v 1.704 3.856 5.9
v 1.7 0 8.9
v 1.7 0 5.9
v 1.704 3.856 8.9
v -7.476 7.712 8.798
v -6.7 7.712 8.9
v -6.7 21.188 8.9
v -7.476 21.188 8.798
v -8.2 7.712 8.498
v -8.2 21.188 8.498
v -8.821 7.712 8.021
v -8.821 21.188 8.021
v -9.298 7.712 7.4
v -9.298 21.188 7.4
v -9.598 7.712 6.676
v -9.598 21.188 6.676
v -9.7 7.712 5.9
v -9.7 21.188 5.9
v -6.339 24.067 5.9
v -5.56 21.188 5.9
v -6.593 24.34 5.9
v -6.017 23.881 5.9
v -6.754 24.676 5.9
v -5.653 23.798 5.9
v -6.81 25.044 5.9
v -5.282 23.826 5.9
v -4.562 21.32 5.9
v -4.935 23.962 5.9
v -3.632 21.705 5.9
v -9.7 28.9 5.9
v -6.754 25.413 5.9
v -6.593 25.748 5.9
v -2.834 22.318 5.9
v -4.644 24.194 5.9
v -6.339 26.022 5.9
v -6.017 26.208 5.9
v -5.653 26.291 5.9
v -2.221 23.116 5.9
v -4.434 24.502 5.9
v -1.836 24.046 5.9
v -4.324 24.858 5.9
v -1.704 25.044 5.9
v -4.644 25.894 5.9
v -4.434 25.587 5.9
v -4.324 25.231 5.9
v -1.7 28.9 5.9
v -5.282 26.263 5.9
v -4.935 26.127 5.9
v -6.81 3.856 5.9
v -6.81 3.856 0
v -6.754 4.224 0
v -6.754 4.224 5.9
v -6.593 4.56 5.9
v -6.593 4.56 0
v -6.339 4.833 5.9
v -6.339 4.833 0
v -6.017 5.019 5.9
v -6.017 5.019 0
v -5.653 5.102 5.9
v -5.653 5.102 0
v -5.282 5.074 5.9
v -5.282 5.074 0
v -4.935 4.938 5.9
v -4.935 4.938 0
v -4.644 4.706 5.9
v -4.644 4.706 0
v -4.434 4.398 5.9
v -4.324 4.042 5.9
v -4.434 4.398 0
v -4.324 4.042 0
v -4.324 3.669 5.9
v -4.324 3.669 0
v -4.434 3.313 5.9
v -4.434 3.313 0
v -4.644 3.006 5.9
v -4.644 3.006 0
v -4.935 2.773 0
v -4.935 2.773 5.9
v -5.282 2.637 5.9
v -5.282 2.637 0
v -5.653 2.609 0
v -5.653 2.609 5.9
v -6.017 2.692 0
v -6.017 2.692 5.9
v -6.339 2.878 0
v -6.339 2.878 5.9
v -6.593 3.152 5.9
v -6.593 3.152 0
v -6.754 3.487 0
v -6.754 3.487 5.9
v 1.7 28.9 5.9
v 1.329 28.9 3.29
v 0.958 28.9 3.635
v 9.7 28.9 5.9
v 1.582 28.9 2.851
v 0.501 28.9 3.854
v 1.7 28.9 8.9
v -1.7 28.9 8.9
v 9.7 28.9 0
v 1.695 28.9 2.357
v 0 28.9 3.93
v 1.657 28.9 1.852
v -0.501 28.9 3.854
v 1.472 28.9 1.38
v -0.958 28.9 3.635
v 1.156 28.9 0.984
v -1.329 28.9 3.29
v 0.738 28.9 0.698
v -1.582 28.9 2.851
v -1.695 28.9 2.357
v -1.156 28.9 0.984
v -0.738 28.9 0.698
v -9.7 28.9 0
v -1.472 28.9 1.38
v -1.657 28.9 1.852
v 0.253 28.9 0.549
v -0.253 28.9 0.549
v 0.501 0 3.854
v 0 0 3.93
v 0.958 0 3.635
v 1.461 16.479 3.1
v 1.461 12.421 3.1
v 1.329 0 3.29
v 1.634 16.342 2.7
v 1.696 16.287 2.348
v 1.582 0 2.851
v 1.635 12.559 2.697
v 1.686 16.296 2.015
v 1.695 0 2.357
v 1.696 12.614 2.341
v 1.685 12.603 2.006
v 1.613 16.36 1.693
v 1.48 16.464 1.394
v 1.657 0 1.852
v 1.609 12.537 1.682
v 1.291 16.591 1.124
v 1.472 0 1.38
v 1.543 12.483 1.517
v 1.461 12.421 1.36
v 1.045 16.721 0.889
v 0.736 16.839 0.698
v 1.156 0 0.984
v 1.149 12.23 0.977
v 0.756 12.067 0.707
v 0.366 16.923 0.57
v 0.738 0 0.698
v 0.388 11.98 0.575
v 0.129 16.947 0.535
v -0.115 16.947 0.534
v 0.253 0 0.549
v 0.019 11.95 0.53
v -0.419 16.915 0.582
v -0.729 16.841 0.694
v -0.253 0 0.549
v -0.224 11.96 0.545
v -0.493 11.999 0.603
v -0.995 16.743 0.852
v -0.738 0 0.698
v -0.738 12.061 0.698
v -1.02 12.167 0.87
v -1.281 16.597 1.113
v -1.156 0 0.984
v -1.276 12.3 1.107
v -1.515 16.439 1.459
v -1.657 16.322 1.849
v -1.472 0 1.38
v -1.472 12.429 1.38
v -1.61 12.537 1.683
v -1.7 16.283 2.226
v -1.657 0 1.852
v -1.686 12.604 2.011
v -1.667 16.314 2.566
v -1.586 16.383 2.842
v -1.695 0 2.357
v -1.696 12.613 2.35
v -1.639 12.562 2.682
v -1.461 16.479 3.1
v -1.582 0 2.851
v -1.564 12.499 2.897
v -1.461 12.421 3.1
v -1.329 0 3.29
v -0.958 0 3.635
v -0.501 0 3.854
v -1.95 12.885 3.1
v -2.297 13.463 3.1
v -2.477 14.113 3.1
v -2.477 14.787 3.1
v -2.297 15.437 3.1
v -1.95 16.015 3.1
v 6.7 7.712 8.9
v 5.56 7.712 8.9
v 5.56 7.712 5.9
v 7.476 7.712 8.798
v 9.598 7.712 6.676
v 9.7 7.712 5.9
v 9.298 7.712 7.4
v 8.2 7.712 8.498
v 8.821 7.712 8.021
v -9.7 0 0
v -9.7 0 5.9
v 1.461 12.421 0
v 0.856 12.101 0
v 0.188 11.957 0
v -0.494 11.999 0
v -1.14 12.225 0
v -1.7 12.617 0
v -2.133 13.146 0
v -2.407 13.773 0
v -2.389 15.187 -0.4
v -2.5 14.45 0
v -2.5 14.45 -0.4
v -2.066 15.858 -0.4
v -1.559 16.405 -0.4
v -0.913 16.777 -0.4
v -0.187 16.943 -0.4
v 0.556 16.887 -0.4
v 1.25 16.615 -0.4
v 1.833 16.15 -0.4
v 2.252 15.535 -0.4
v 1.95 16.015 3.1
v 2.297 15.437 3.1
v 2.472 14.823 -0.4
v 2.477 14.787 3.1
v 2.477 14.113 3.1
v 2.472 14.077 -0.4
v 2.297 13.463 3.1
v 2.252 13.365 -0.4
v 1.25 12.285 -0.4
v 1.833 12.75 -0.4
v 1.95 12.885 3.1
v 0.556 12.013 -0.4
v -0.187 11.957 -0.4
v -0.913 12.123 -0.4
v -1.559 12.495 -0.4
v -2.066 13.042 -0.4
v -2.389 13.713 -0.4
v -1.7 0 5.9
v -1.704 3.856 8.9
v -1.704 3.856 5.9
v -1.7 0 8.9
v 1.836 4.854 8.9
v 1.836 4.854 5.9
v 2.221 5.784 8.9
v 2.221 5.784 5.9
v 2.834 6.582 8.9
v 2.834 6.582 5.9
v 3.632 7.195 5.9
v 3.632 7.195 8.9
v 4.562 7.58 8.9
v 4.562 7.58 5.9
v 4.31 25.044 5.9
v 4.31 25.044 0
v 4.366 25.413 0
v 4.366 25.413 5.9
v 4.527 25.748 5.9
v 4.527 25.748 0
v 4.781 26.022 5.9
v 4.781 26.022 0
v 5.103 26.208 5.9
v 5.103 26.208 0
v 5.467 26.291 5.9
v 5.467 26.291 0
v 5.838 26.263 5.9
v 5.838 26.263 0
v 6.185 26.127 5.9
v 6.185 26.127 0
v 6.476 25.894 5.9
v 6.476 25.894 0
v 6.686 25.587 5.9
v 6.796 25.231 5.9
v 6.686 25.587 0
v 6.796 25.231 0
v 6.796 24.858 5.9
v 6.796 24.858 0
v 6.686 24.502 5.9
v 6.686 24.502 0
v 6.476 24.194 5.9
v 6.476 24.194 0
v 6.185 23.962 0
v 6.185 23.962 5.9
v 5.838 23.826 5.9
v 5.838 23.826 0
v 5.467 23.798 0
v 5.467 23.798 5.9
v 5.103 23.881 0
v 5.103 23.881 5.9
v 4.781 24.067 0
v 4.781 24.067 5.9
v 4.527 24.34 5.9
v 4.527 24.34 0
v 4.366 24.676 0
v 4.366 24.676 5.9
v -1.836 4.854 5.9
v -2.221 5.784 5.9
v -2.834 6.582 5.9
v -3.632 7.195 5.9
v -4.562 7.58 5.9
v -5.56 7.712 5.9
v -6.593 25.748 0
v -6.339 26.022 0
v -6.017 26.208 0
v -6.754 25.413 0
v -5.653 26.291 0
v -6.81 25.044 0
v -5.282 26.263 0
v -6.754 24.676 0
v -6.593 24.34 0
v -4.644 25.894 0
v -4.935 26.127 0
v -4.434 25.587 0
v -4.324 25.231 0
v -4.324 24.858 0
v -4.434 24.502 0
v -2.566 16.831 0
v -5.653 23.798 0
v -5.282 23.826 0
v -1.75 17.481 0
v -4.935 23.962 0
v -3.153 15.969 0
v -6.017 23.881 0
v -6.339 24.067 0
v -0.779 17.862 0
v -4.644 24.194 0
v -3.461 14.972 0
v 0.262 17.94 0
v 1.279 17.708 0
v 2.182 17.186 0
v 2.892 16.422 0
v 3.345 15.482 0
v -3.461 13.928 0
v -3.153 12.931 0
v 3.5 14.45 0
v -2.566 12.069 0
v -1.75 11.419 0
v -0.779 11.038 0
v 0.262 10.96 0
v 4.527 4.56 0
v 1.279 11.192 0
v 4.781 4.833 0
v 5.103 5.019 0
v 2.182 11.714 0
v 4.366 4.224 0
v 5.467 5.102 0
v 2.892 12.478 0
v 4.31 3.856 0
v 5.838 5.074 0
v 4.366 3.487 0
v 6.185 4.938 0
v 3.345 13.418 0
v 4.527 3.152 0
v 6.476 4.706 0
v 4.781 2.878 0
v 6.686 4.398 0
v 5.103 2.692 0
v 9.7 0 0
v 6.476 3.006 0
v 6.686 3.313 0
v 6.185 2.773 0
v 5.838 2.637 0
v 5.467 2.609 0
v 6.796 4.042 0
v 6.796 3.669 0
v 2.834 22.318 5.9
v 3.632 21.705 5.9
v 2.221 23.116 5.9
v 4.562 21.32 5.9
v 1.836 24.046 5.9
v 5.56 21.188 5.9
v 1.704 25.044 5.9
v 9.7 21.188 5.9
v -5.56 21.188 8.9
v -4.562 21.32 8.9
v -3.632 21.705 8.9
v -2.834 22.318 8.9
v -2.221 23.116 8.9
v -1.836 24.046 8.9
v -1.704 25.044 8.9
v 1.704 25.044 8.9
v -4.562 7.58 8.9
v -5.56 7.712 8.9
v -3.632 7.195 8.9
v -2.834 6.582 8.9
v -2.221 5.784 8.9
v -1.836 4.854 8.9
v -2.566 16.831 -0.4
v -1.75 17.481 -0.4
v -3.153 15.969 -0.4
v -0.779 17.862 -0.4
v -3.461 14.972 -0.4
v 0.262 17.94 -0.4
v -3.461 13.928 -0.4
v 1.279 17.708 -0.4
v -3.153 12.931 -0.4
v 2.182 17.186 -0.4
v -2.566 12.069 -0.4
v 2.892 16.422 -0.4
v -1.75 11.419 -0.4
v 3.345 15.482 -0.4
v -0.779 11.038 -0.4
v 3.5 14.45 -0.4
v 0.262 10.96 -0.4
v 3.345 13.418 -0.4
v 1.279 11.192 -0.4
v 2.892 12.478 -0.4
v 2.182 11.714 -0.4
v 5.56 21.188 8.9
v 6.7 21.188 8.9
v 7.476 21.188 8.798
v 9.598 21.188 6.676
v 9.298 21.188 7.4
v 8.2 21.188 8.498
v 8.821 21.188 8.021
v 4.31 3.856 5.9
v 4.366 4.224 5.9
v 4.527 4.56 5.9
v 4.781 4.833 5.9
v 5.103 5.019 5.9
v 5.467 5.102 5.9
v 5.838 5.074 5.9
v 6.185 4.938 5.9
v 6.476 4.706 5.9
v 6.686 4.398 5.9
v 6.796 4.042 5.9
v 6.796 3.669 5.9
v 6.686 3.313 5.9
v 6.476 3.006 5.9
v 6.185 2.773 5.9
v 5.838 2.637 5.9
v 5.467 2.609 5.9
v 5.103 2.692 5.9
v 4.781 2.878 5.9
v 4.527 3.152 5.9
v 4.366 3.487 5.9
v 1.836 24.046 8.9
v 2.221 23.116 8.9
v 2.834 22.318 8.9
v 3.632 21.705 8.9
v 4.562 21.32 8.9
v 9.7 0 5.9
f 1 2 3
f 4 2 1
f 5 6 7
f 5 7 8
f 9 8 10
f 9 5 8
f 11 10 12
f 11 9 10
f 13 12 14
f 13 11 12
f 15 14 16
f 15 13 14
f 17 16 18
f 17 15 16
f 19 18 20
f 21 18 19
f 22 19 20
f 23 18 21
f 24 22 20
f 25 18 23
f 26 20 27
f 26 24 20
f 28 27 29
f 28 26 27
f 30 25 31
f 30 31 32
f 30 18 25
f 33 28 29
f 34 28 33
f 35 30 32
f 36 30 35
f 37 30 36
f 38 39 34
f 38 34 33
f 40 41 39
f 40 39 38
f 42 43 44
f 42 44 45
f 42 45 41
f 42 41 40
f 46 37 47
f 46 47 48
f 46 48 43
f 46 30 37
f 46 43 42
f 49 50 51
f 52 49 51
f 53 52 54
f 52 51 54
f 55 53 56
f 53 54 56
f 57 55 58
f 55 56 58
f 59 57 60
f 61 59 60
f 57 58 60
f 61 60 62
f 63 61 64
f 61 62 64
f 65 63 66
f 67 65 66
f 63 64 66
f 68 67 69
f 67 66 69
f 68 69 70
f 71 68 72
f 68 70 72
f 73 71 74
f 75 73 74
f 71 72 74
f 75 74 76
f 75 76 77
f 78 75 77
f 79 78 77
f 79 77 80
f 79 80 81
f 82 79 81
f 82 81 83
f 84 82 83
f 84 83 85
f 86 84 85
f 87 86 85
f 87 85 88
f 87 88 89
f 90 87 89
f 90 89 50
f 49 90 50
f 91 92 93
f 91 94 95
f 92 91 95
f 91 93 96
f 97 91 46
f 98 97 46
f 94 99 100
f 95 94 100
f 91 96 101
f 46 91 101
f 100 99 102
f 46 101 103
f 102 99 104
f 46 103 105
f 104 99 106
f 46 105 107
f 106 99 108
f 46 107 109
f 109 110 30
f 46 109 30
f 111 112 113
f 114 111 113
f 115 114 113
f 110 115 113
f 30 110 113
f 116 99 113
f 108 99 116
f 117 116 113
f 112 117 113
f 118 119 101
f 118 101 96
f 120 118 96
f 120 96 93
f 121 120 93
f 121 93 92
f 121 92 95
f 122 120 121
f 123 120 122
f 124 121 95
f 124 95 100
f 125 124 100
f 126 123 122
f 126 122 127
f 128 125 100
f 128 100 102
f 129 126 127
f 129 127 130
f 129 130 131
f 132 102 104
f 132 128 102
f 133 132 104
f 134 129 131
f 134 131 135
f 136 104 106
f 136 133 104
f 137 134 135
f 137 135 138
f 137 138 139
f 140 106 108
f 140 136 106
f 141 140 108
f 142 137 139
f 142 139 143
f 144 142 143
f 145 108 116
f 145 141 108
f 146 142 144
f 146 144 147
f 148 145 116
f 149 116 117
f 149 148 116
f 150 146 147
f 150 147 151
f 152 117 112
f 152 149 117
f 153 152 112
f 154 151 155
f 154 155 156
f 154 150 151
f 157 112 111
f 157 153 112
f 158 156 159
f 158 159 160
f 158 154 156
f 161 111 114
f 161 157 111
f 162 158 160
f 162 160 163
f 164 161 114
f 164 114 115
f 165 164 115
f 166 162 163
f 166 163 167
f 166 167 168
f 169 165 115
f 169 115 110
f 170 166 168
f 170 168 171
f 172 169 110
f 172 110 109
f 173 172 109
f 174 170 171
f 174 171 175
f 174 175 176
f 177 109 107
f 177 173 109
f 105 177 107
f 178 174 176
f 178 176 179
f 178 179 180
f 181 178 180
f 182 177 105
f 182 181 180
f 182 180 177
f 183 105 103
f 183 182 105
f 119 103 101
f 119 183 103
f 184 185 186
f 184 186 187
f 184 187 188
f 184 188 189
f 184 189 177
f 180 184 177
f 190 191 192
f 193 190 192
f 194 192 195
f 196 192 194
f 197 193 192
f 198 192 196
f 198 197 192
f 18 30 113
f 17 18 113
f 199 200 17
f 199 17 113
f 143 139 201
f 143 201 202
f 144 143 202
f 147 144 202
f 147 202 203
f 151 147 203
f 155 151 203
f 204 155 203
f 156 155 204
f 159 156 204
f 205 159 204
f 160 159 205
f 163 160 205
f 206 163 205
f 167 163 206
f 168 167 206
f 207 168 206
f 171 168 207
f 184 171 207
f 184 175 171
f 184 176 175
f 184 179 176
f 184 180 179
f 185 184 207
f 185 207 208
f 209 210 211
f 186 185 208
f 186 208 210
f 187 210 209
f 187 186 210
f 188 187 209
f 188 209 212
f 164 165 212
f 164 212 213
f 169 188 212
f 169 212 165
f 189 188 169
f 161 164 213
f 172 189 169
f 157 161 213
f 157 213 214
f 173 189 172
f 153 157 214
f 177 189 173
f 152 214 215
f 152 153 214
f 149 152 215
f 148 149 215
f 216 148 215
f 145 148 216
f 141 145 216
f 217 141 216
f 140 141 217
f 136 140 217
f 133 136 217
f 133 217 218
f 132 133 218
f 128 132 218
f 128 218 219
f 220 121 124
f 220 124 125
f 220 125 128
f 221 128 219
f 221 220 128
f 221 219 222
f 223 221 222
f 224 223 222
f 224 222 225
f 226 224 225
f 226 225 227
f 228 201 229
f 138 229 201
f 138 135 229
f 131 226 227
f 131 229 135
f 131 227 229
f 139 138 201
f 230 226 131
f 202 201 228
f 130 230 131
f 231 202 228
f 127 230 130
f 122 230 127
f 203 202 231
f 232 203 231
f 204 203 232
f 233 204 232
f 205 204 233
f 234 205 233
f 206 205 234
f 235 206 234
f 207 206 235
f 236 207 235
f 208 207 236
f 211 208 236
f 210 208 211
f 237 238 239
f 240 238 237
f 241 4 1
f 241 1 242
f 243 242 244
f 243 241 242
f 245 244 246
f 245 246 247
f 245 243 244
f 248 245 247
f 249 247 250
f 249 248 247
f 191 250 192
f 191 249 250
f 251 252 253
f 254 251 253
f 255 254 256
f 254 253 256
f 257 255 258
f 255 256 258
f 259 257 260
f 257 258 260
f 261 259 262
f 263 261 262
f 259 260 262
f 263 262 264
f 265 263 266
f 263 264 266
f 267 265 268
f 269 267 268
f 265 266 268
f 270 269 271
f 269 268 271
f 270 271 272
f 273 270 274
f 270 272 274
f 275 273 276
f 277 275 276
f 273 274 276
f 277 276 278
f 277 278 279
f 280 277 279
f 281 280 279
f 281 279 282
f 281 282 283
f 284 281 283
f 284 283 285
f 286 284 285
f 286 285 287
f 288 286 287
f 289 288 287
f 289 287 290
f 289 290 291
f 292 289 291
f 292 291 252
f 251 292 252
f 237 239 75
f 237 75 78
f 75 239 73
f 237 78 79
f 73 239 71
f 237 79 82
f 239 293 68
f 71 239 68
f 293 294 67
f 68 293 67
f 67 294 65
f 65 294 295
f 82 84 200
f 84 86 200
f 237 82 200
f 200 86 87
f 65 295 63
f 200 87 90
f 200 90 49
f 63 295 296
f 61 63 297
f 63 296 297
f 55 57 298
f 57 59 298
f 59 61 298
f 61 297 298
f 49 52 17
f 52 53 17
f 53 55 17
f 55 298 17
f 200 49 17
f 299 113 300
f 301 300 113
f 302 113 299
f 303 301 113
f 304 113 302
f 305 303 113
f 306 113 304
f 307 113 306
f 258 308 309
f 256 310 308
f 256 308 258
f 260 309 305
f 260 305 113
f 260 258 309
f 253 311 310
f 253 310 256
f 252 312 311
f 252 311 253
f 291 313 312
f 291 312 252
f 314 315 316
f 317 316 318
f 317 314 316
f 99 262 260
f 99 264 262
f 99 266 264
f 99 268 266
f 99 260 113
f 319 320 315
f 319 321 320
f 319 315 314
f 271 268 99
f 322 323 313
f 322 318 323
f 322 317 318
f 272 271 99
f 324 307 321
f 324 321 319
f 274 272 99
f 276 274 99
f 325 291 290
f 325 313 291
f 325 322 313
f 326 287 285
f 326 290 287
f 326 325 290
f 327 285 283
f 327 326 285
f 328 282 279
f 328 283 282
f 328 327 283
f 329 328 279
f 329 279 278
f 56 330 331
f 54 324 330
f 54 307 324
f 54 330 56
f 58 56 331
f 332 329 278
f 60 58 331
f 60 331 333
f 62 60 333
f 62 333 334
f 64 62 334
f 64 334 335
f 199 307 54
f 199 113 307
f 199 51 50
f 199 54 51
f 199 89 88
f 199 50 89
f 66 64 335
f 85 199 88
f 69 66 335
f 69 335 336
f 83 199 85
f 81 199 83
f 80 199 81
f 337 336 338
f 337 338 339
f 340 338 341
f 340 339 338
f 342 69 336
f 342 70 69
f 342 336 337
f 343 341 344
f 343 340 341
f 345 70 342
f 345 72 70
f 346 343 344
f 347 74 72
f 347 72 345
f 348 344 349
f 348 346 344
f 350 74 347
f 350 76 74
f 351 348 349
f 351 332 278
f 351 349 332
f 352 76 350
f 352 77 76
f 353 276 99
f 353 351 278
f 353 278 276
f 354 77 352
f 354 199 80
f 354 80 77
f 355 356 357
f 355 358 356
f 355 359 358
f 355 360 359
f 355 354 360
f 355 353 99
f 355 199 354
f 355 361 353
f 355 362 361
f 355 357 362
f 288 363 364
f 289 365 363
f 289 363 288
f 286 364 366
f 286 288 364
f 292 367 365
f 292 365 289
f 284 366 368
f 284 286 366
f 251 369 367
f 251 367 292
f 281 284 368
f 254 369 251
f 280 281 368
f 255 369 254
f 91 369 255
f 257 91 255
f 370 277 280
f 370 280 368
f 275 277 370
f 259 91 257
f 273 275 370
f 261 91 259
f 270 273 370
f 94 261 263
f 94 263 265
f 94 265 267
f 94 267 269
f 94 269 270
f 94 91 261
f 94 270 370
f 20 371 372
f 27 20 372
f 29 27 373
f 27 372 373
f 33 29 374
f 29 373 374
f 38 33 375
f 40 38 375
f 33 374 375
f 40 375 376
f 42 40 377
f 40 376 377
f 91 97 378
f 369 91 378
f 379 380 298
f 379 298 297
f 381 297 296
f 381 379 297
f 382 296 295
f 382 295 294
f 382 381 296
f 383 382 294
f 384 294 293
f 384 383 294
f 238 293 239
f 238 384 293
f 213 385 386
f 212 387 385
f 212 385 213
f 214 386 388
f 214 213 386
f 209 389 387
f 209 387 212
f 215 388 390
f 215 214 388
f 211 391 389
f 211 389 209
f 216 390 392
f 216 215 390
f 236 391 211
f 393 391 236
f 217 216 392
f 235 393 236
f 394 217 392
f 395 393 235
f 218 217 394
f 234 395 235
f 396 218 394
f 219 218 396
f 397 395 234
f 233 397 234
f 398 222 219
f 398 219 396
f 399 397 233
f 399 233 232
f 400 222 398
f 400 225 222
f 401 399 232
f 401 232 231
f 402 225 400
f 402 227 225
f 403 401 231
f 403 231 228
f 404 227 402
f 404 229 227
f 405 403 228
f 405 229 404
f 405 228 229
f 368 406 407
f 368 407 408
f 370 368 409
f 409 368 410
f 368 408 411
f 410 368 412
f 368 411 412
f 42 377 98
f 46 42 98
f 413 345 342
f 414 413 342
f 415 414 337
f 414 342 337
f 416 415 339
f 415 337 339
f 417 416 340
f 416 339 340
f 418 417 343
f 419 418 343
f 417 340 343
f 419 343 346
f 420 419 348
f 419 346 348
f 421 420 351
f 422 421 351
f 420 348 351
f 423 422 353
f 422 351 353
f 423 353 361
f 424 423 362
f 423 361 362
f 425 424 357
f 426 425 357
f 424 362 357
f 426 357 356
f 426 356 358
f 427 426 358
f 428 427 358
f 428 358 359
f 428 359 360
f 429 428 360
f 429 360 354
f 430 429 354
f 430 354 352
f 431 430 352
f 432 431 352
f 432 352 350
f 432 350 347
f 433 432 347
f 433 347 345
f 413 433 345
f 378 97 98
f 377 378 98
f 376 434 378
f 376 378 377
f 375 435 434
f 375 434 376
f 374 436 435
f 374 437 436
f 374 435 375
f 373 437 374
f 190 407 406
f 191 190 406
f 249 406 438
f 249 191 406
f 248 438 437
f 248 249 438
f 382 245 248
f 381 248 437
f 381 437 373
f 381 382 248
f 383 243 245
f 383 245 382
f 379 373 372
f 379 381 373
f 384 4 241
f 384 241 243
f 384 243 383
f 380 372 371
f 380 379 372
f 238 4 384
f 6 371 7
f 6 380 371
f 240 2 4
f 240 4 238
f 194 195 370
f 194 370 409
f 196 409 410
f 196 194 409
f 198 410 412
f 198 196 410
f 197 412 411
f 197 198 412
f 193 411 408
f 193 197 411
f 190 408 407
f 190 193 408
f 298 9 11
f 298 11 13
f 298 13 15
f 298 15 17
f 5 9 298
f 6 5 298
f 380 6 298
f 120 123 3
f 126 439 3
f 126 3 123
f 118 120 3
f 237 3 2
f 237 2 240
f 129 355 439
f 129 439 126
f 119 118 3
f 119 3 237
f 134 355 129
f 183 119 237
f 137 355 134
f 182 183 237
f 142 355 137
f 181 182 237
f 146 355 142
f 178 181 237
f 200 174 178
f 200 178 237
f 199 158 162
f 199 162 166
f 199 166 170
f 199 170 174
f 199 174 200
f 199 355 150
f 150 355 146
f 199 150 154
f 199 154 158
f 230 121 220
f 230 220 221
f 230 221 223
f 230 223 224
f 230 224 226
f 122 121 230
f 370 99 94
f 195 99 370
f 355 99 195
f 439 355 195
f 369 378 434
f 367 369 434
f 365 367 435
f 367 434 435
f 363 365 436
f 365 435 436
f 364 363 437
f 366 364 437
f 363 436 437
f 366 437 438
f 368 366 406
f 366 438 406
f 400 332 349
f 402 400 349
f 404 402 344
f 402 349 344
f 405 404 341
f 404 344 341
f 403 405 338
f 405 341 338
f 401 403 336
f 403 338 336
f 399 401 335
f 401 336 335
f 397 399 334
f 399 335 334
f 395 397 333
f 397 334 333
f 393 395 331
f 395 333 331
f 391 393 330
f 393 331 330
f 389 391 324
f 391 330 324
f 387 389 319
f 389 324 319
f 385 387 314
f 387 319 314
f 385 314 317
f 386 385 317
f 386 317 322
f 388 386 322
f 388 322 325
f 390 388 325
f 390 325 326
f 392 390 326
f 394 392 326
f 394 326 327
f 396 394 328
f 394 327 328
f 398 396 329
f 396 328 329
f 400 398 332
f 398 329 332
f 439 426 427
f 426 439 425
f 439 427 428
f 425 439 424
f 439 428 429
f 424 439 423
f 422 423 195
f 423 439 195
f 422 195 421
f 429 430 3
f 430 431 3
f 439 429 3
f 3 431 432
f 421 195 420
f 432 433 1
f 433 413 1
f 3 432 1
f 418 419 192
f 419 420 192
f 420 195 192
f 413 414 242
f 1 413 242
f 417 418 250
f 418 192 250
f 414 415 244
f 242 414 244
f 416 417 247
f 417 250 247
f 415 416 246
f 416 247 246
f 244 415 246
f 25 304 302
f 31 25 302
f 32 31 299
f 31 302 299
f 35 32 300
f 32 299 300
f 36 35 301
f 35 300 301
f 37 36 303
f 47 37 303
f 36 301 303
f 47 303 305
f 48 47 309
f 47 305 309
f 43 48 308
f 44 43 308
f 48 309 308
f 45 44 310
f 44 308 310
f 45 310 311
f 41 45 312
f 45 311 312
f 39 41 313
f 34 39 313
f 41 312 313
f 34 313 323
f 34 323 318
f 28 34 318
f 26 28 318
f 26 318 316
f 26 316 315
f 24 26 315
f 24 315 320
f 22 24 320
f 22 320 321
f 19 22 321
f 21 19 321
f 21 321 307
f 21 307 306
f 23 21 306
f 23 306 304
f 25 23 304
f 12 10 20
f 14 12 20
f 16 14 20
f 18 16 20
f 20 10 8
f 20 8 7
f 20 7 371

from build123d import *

# Parameters (mm, degrees)
SKETCH1_R           = 1.7
BOSS_EXTRUDE1_DEPTH = 28.9
CUT_EXTRUDE1_REACH  = 33.757
SKETCH2_R           = 1.25
CUT_EXTRUDE2_DEPTH  = 3
SKETCH4_R           = 3.5
SKETCH4_R_2         = 2.5
BOSS_EXTRUDE2_DEPTH = 0.4
CUT_EXTRUDE3_START  = -3.5
SKETCH5_R           = 2.5
CUT_EXTRUDE3_DEPTH  = 3.5


with BuildPart() as part:
    # Sketch1 → Boss-Extrude1 (new body)
    with BuildSketch(Plane(origin=(0, 0, 0), x_dir=(1, 0, 0), z_dir=(0, 1, 0))):
        with BuildLine():
            Line((-9.7, 0), (9.7, 0))
            Line((9.7, 0), (9.7, -5.9))
            ThreePointArc((9.7, -5.9), (8.821320344, -8.021320344), (6.7, -8.9))
            Line((6.7, -8.9), (-6.7, -8.9))
            ThreePointArc((-6.7, -8.9), (-8.821320344, -8.021320344), (-9.7, -5.9))
            Line((-9.7, -5.9), (-9.7, 0))
        make_face()
        with Locations(Location((0, -2.23, 0), (0, 0, 270))):
            Circle(SKETCH1_R, mode=Mode.SUBTRACT)
    extrude(amount=BOSS_EXTRUDE1_DEPTH)

    # Cut-Extrude1: up to this face of the body (flat: up to its plane)
    cut_extrude1_end = Plane(part.part.faces().sort_by_distance((0, 14.45, 8.9))[0])
    # Sketch2 → Cut-Extrude1 (cut, up to the picked face)
    with BuildSketch(Plane(origin=(0, 0, 0), x_dir=(-1, 0, 0), z_dir=(0, 0, -1)), mode=Mode.PRIVATE) as cut_extrude1_sk1:
        with Locations((5.56, 25.044233664)):
            Circle(SKETCH2_R)
    cut_extrude1_tool1 = split(extrude(cut_extrude1_sk1.sketch, amount=-CUT_EXTRUDE1_REACH, mode=Mode.PRIVATE), bisect_by=cut_extrude1_end, keep=Keep.BOTH, mode=Mode.PRIVATE)
    # Sketch2 → Cut-Extrude1 (cut, up to the picked face)
    with BuildSketch(Plane(origin=(0, 0, 0), x_dir=(-1, 0, 0), z_dir=(0, 0, -1)), mode=Mode.PRIVATE) as cut_extrude1_sk2:
        with Locations((5.56, 3.855766336)):
            Circle(SKETCH2_R)
    cut_extrude1_tool2 = split(extrude(cut_extrude1_sk2.sketch, amount=-CUT_EXTRUDE1_REACH, mode=Mode.PRIVATE), bisect_by=cut_extrude1_end, keep=Keep.BOTH, mode=Mode.PRIVATE)
    # Sketch2 → Cut-Extrude1 (cut, up to the picked face)
    with BuildSketch(Plane(origin=(0, 0, 0), x_dir=(-1, 0, 0), z_dir=(0, 0, -1)), mode=Mode.PRIVATE) as cut_extrude1_sk3:
        with Locations((-5.56, 3.855766336)):
            Circle(SKETCH2_R)
    cut_extrude1_tool3 = split(extrude(cut_extrude1_sk3.sketch, amount=-CUT_EXTRUDE1_REACH, mode=Mode.PRIVATE), bisect_by=cut_extrude1_end, keep=Keep.BOTH, mode=Mode.PRIVATE)
    # Sketch2 → Cut-Extrude1 (cut, up to the picked face)
    with BuildSketch(Plane(origin=(0, 0, 0), x_dir=(-1, 0, 0), z_dir=(0, 0, -1)), mode=Mode.PRIVATE) as cut_extrude1_sk4:
        with Locations((-5.56, 25.044233664)):
            Circle(SKETCH2_R)
    cut_extrude1_tool4 = split(extrude(cut_extrude1_sk4.sketch, amount=-CUT_EXTRUDE1_REACH, mode=Mode.PRIVATE), bisect_by=cut_extrude1_end, keep=Keep.BOTH, mode=Mode.PRIVATE)
    add(cut_extrude1_tool1.solids().sort_by(Axis((-5.56, 25.044234, 0), (0, 0, 1)))[0], mode=Mode.SUBTRACT)
    add(cut_extrude1_tool2.solids().sort_by(Axis((-5.56, 3.855766, 0), (0, 0, 1)))[0], mode=Mode.SUBTRACT)
    add(cut_extrude1_tool3.solids().sort_by(Axis((5.56, 3.855766, 0), (0, 0, 1)))[0], mode=Mode.SUBTRACT)
    add(cut_extrude1_tool4.solids().sort_by(Axis((5.56, 25.044234, 0), (0, 0, 1)))[0], mode=Mode.SUBTRACT)

    # Sketch3 → Cut-Extrude2 (cut)
    with BuildSketch(Plane.XY.offset(8.9)):
        with BuildLine():
            Line((5.56, 7.711532672), (9.7, 7.711532672))
            Line((9.7, 7.711532672), (9.7, 0))
            Line((9.7, 0), (1.7, 0))
            Line((1.7, 0), (1.704233664, 3.855766336))
            ThreePointArc((1.704233664, 3.855766336), (2.833561477, 6.582204859), (5.56, 7.711532672))
        make_face()
        with BuildLine():
            Line((5.56, 21.188467328), (9.7, 21.188467328))
            Line((9.7, 21.188467328), (9.7, 28.9))
            Line((9.7, 28.9), (1.7, 28.9))
            Line((1.7, 28.9), (1.704233664, 25.044233664))
            ThreePointArc((1.704233664, 25.044233664), (2.833561477, 22.317795141), (5.56, 21.188467328))
        make_face()
        with BuildLine():
            Line((-1.704233664, 3.855766336), (-1.7, 0))
            Line((-1.7, 0), (-9.7, 0))
            Line((-9.7, 0), (-9.7, 7.711532672))
            Line((-9.7, 7.711532672), (-5.56, 7.711532672))
            ThreePointArc((-5.56, 7.711532672), (-2.833561477, 6.582204859), (-1.704233664, 3.855766336))
        make_face()
        with BuildLine():
            Line((-9.7, 28.9), (-9.7, 21.188467328))
            Line((-9.7, 21.188467328), (-5.56, 21.188467328))
            ThreePointArc((-5.56, 21.188467328), (-2.833561477, 22.317795141), (-1.704233664, 25.044233664))
            Line((-1.704233664, 25.044233664), (-1.7, 28.9))
            Line((-1.7, 28.9), (-9.7, 28.9))
        make_face()
    extrude(amount=-CUT_EXTRUDE2_DEPTH, mode=Mode.SUBTRACT)

    # Sketch4 → Boss-Extrude2 (add)
    with BuildSketch(Plane(origin=(0, 0, 0), x_dir=(-1, 0, 0), z_dir=(0, 0, -1))):
        with Locations(Location((0, 14.45, 0), (0, 0, 180))):
            Circle(SKETCH4_R)
        with Locations((0, 14.45)):
            Circle(SKETCH4_R_2, mode=Mode.SUBTRACT)
    extrude(amount=BOSS_EXTRUDE2_DEPTH)

    # Sketch5 → Cut-Extrude3 (cut)
    with BuildSketch(Plane(origin=(0, 0, -0.4), x_dir=(-1, 0, 0), z_dir=(0, 0, -1)).offset(CUT_EXTRUDE3_START)):
        with Locations(Location((0, 14.45, 0), (0, 0, 234.253121961))):
            Circle(SKETCH5_R)
    extrude(amount=CUT_EXTRUDE3_DEPTH, mode=Mode.SUBTRACT)


solid = part.part
